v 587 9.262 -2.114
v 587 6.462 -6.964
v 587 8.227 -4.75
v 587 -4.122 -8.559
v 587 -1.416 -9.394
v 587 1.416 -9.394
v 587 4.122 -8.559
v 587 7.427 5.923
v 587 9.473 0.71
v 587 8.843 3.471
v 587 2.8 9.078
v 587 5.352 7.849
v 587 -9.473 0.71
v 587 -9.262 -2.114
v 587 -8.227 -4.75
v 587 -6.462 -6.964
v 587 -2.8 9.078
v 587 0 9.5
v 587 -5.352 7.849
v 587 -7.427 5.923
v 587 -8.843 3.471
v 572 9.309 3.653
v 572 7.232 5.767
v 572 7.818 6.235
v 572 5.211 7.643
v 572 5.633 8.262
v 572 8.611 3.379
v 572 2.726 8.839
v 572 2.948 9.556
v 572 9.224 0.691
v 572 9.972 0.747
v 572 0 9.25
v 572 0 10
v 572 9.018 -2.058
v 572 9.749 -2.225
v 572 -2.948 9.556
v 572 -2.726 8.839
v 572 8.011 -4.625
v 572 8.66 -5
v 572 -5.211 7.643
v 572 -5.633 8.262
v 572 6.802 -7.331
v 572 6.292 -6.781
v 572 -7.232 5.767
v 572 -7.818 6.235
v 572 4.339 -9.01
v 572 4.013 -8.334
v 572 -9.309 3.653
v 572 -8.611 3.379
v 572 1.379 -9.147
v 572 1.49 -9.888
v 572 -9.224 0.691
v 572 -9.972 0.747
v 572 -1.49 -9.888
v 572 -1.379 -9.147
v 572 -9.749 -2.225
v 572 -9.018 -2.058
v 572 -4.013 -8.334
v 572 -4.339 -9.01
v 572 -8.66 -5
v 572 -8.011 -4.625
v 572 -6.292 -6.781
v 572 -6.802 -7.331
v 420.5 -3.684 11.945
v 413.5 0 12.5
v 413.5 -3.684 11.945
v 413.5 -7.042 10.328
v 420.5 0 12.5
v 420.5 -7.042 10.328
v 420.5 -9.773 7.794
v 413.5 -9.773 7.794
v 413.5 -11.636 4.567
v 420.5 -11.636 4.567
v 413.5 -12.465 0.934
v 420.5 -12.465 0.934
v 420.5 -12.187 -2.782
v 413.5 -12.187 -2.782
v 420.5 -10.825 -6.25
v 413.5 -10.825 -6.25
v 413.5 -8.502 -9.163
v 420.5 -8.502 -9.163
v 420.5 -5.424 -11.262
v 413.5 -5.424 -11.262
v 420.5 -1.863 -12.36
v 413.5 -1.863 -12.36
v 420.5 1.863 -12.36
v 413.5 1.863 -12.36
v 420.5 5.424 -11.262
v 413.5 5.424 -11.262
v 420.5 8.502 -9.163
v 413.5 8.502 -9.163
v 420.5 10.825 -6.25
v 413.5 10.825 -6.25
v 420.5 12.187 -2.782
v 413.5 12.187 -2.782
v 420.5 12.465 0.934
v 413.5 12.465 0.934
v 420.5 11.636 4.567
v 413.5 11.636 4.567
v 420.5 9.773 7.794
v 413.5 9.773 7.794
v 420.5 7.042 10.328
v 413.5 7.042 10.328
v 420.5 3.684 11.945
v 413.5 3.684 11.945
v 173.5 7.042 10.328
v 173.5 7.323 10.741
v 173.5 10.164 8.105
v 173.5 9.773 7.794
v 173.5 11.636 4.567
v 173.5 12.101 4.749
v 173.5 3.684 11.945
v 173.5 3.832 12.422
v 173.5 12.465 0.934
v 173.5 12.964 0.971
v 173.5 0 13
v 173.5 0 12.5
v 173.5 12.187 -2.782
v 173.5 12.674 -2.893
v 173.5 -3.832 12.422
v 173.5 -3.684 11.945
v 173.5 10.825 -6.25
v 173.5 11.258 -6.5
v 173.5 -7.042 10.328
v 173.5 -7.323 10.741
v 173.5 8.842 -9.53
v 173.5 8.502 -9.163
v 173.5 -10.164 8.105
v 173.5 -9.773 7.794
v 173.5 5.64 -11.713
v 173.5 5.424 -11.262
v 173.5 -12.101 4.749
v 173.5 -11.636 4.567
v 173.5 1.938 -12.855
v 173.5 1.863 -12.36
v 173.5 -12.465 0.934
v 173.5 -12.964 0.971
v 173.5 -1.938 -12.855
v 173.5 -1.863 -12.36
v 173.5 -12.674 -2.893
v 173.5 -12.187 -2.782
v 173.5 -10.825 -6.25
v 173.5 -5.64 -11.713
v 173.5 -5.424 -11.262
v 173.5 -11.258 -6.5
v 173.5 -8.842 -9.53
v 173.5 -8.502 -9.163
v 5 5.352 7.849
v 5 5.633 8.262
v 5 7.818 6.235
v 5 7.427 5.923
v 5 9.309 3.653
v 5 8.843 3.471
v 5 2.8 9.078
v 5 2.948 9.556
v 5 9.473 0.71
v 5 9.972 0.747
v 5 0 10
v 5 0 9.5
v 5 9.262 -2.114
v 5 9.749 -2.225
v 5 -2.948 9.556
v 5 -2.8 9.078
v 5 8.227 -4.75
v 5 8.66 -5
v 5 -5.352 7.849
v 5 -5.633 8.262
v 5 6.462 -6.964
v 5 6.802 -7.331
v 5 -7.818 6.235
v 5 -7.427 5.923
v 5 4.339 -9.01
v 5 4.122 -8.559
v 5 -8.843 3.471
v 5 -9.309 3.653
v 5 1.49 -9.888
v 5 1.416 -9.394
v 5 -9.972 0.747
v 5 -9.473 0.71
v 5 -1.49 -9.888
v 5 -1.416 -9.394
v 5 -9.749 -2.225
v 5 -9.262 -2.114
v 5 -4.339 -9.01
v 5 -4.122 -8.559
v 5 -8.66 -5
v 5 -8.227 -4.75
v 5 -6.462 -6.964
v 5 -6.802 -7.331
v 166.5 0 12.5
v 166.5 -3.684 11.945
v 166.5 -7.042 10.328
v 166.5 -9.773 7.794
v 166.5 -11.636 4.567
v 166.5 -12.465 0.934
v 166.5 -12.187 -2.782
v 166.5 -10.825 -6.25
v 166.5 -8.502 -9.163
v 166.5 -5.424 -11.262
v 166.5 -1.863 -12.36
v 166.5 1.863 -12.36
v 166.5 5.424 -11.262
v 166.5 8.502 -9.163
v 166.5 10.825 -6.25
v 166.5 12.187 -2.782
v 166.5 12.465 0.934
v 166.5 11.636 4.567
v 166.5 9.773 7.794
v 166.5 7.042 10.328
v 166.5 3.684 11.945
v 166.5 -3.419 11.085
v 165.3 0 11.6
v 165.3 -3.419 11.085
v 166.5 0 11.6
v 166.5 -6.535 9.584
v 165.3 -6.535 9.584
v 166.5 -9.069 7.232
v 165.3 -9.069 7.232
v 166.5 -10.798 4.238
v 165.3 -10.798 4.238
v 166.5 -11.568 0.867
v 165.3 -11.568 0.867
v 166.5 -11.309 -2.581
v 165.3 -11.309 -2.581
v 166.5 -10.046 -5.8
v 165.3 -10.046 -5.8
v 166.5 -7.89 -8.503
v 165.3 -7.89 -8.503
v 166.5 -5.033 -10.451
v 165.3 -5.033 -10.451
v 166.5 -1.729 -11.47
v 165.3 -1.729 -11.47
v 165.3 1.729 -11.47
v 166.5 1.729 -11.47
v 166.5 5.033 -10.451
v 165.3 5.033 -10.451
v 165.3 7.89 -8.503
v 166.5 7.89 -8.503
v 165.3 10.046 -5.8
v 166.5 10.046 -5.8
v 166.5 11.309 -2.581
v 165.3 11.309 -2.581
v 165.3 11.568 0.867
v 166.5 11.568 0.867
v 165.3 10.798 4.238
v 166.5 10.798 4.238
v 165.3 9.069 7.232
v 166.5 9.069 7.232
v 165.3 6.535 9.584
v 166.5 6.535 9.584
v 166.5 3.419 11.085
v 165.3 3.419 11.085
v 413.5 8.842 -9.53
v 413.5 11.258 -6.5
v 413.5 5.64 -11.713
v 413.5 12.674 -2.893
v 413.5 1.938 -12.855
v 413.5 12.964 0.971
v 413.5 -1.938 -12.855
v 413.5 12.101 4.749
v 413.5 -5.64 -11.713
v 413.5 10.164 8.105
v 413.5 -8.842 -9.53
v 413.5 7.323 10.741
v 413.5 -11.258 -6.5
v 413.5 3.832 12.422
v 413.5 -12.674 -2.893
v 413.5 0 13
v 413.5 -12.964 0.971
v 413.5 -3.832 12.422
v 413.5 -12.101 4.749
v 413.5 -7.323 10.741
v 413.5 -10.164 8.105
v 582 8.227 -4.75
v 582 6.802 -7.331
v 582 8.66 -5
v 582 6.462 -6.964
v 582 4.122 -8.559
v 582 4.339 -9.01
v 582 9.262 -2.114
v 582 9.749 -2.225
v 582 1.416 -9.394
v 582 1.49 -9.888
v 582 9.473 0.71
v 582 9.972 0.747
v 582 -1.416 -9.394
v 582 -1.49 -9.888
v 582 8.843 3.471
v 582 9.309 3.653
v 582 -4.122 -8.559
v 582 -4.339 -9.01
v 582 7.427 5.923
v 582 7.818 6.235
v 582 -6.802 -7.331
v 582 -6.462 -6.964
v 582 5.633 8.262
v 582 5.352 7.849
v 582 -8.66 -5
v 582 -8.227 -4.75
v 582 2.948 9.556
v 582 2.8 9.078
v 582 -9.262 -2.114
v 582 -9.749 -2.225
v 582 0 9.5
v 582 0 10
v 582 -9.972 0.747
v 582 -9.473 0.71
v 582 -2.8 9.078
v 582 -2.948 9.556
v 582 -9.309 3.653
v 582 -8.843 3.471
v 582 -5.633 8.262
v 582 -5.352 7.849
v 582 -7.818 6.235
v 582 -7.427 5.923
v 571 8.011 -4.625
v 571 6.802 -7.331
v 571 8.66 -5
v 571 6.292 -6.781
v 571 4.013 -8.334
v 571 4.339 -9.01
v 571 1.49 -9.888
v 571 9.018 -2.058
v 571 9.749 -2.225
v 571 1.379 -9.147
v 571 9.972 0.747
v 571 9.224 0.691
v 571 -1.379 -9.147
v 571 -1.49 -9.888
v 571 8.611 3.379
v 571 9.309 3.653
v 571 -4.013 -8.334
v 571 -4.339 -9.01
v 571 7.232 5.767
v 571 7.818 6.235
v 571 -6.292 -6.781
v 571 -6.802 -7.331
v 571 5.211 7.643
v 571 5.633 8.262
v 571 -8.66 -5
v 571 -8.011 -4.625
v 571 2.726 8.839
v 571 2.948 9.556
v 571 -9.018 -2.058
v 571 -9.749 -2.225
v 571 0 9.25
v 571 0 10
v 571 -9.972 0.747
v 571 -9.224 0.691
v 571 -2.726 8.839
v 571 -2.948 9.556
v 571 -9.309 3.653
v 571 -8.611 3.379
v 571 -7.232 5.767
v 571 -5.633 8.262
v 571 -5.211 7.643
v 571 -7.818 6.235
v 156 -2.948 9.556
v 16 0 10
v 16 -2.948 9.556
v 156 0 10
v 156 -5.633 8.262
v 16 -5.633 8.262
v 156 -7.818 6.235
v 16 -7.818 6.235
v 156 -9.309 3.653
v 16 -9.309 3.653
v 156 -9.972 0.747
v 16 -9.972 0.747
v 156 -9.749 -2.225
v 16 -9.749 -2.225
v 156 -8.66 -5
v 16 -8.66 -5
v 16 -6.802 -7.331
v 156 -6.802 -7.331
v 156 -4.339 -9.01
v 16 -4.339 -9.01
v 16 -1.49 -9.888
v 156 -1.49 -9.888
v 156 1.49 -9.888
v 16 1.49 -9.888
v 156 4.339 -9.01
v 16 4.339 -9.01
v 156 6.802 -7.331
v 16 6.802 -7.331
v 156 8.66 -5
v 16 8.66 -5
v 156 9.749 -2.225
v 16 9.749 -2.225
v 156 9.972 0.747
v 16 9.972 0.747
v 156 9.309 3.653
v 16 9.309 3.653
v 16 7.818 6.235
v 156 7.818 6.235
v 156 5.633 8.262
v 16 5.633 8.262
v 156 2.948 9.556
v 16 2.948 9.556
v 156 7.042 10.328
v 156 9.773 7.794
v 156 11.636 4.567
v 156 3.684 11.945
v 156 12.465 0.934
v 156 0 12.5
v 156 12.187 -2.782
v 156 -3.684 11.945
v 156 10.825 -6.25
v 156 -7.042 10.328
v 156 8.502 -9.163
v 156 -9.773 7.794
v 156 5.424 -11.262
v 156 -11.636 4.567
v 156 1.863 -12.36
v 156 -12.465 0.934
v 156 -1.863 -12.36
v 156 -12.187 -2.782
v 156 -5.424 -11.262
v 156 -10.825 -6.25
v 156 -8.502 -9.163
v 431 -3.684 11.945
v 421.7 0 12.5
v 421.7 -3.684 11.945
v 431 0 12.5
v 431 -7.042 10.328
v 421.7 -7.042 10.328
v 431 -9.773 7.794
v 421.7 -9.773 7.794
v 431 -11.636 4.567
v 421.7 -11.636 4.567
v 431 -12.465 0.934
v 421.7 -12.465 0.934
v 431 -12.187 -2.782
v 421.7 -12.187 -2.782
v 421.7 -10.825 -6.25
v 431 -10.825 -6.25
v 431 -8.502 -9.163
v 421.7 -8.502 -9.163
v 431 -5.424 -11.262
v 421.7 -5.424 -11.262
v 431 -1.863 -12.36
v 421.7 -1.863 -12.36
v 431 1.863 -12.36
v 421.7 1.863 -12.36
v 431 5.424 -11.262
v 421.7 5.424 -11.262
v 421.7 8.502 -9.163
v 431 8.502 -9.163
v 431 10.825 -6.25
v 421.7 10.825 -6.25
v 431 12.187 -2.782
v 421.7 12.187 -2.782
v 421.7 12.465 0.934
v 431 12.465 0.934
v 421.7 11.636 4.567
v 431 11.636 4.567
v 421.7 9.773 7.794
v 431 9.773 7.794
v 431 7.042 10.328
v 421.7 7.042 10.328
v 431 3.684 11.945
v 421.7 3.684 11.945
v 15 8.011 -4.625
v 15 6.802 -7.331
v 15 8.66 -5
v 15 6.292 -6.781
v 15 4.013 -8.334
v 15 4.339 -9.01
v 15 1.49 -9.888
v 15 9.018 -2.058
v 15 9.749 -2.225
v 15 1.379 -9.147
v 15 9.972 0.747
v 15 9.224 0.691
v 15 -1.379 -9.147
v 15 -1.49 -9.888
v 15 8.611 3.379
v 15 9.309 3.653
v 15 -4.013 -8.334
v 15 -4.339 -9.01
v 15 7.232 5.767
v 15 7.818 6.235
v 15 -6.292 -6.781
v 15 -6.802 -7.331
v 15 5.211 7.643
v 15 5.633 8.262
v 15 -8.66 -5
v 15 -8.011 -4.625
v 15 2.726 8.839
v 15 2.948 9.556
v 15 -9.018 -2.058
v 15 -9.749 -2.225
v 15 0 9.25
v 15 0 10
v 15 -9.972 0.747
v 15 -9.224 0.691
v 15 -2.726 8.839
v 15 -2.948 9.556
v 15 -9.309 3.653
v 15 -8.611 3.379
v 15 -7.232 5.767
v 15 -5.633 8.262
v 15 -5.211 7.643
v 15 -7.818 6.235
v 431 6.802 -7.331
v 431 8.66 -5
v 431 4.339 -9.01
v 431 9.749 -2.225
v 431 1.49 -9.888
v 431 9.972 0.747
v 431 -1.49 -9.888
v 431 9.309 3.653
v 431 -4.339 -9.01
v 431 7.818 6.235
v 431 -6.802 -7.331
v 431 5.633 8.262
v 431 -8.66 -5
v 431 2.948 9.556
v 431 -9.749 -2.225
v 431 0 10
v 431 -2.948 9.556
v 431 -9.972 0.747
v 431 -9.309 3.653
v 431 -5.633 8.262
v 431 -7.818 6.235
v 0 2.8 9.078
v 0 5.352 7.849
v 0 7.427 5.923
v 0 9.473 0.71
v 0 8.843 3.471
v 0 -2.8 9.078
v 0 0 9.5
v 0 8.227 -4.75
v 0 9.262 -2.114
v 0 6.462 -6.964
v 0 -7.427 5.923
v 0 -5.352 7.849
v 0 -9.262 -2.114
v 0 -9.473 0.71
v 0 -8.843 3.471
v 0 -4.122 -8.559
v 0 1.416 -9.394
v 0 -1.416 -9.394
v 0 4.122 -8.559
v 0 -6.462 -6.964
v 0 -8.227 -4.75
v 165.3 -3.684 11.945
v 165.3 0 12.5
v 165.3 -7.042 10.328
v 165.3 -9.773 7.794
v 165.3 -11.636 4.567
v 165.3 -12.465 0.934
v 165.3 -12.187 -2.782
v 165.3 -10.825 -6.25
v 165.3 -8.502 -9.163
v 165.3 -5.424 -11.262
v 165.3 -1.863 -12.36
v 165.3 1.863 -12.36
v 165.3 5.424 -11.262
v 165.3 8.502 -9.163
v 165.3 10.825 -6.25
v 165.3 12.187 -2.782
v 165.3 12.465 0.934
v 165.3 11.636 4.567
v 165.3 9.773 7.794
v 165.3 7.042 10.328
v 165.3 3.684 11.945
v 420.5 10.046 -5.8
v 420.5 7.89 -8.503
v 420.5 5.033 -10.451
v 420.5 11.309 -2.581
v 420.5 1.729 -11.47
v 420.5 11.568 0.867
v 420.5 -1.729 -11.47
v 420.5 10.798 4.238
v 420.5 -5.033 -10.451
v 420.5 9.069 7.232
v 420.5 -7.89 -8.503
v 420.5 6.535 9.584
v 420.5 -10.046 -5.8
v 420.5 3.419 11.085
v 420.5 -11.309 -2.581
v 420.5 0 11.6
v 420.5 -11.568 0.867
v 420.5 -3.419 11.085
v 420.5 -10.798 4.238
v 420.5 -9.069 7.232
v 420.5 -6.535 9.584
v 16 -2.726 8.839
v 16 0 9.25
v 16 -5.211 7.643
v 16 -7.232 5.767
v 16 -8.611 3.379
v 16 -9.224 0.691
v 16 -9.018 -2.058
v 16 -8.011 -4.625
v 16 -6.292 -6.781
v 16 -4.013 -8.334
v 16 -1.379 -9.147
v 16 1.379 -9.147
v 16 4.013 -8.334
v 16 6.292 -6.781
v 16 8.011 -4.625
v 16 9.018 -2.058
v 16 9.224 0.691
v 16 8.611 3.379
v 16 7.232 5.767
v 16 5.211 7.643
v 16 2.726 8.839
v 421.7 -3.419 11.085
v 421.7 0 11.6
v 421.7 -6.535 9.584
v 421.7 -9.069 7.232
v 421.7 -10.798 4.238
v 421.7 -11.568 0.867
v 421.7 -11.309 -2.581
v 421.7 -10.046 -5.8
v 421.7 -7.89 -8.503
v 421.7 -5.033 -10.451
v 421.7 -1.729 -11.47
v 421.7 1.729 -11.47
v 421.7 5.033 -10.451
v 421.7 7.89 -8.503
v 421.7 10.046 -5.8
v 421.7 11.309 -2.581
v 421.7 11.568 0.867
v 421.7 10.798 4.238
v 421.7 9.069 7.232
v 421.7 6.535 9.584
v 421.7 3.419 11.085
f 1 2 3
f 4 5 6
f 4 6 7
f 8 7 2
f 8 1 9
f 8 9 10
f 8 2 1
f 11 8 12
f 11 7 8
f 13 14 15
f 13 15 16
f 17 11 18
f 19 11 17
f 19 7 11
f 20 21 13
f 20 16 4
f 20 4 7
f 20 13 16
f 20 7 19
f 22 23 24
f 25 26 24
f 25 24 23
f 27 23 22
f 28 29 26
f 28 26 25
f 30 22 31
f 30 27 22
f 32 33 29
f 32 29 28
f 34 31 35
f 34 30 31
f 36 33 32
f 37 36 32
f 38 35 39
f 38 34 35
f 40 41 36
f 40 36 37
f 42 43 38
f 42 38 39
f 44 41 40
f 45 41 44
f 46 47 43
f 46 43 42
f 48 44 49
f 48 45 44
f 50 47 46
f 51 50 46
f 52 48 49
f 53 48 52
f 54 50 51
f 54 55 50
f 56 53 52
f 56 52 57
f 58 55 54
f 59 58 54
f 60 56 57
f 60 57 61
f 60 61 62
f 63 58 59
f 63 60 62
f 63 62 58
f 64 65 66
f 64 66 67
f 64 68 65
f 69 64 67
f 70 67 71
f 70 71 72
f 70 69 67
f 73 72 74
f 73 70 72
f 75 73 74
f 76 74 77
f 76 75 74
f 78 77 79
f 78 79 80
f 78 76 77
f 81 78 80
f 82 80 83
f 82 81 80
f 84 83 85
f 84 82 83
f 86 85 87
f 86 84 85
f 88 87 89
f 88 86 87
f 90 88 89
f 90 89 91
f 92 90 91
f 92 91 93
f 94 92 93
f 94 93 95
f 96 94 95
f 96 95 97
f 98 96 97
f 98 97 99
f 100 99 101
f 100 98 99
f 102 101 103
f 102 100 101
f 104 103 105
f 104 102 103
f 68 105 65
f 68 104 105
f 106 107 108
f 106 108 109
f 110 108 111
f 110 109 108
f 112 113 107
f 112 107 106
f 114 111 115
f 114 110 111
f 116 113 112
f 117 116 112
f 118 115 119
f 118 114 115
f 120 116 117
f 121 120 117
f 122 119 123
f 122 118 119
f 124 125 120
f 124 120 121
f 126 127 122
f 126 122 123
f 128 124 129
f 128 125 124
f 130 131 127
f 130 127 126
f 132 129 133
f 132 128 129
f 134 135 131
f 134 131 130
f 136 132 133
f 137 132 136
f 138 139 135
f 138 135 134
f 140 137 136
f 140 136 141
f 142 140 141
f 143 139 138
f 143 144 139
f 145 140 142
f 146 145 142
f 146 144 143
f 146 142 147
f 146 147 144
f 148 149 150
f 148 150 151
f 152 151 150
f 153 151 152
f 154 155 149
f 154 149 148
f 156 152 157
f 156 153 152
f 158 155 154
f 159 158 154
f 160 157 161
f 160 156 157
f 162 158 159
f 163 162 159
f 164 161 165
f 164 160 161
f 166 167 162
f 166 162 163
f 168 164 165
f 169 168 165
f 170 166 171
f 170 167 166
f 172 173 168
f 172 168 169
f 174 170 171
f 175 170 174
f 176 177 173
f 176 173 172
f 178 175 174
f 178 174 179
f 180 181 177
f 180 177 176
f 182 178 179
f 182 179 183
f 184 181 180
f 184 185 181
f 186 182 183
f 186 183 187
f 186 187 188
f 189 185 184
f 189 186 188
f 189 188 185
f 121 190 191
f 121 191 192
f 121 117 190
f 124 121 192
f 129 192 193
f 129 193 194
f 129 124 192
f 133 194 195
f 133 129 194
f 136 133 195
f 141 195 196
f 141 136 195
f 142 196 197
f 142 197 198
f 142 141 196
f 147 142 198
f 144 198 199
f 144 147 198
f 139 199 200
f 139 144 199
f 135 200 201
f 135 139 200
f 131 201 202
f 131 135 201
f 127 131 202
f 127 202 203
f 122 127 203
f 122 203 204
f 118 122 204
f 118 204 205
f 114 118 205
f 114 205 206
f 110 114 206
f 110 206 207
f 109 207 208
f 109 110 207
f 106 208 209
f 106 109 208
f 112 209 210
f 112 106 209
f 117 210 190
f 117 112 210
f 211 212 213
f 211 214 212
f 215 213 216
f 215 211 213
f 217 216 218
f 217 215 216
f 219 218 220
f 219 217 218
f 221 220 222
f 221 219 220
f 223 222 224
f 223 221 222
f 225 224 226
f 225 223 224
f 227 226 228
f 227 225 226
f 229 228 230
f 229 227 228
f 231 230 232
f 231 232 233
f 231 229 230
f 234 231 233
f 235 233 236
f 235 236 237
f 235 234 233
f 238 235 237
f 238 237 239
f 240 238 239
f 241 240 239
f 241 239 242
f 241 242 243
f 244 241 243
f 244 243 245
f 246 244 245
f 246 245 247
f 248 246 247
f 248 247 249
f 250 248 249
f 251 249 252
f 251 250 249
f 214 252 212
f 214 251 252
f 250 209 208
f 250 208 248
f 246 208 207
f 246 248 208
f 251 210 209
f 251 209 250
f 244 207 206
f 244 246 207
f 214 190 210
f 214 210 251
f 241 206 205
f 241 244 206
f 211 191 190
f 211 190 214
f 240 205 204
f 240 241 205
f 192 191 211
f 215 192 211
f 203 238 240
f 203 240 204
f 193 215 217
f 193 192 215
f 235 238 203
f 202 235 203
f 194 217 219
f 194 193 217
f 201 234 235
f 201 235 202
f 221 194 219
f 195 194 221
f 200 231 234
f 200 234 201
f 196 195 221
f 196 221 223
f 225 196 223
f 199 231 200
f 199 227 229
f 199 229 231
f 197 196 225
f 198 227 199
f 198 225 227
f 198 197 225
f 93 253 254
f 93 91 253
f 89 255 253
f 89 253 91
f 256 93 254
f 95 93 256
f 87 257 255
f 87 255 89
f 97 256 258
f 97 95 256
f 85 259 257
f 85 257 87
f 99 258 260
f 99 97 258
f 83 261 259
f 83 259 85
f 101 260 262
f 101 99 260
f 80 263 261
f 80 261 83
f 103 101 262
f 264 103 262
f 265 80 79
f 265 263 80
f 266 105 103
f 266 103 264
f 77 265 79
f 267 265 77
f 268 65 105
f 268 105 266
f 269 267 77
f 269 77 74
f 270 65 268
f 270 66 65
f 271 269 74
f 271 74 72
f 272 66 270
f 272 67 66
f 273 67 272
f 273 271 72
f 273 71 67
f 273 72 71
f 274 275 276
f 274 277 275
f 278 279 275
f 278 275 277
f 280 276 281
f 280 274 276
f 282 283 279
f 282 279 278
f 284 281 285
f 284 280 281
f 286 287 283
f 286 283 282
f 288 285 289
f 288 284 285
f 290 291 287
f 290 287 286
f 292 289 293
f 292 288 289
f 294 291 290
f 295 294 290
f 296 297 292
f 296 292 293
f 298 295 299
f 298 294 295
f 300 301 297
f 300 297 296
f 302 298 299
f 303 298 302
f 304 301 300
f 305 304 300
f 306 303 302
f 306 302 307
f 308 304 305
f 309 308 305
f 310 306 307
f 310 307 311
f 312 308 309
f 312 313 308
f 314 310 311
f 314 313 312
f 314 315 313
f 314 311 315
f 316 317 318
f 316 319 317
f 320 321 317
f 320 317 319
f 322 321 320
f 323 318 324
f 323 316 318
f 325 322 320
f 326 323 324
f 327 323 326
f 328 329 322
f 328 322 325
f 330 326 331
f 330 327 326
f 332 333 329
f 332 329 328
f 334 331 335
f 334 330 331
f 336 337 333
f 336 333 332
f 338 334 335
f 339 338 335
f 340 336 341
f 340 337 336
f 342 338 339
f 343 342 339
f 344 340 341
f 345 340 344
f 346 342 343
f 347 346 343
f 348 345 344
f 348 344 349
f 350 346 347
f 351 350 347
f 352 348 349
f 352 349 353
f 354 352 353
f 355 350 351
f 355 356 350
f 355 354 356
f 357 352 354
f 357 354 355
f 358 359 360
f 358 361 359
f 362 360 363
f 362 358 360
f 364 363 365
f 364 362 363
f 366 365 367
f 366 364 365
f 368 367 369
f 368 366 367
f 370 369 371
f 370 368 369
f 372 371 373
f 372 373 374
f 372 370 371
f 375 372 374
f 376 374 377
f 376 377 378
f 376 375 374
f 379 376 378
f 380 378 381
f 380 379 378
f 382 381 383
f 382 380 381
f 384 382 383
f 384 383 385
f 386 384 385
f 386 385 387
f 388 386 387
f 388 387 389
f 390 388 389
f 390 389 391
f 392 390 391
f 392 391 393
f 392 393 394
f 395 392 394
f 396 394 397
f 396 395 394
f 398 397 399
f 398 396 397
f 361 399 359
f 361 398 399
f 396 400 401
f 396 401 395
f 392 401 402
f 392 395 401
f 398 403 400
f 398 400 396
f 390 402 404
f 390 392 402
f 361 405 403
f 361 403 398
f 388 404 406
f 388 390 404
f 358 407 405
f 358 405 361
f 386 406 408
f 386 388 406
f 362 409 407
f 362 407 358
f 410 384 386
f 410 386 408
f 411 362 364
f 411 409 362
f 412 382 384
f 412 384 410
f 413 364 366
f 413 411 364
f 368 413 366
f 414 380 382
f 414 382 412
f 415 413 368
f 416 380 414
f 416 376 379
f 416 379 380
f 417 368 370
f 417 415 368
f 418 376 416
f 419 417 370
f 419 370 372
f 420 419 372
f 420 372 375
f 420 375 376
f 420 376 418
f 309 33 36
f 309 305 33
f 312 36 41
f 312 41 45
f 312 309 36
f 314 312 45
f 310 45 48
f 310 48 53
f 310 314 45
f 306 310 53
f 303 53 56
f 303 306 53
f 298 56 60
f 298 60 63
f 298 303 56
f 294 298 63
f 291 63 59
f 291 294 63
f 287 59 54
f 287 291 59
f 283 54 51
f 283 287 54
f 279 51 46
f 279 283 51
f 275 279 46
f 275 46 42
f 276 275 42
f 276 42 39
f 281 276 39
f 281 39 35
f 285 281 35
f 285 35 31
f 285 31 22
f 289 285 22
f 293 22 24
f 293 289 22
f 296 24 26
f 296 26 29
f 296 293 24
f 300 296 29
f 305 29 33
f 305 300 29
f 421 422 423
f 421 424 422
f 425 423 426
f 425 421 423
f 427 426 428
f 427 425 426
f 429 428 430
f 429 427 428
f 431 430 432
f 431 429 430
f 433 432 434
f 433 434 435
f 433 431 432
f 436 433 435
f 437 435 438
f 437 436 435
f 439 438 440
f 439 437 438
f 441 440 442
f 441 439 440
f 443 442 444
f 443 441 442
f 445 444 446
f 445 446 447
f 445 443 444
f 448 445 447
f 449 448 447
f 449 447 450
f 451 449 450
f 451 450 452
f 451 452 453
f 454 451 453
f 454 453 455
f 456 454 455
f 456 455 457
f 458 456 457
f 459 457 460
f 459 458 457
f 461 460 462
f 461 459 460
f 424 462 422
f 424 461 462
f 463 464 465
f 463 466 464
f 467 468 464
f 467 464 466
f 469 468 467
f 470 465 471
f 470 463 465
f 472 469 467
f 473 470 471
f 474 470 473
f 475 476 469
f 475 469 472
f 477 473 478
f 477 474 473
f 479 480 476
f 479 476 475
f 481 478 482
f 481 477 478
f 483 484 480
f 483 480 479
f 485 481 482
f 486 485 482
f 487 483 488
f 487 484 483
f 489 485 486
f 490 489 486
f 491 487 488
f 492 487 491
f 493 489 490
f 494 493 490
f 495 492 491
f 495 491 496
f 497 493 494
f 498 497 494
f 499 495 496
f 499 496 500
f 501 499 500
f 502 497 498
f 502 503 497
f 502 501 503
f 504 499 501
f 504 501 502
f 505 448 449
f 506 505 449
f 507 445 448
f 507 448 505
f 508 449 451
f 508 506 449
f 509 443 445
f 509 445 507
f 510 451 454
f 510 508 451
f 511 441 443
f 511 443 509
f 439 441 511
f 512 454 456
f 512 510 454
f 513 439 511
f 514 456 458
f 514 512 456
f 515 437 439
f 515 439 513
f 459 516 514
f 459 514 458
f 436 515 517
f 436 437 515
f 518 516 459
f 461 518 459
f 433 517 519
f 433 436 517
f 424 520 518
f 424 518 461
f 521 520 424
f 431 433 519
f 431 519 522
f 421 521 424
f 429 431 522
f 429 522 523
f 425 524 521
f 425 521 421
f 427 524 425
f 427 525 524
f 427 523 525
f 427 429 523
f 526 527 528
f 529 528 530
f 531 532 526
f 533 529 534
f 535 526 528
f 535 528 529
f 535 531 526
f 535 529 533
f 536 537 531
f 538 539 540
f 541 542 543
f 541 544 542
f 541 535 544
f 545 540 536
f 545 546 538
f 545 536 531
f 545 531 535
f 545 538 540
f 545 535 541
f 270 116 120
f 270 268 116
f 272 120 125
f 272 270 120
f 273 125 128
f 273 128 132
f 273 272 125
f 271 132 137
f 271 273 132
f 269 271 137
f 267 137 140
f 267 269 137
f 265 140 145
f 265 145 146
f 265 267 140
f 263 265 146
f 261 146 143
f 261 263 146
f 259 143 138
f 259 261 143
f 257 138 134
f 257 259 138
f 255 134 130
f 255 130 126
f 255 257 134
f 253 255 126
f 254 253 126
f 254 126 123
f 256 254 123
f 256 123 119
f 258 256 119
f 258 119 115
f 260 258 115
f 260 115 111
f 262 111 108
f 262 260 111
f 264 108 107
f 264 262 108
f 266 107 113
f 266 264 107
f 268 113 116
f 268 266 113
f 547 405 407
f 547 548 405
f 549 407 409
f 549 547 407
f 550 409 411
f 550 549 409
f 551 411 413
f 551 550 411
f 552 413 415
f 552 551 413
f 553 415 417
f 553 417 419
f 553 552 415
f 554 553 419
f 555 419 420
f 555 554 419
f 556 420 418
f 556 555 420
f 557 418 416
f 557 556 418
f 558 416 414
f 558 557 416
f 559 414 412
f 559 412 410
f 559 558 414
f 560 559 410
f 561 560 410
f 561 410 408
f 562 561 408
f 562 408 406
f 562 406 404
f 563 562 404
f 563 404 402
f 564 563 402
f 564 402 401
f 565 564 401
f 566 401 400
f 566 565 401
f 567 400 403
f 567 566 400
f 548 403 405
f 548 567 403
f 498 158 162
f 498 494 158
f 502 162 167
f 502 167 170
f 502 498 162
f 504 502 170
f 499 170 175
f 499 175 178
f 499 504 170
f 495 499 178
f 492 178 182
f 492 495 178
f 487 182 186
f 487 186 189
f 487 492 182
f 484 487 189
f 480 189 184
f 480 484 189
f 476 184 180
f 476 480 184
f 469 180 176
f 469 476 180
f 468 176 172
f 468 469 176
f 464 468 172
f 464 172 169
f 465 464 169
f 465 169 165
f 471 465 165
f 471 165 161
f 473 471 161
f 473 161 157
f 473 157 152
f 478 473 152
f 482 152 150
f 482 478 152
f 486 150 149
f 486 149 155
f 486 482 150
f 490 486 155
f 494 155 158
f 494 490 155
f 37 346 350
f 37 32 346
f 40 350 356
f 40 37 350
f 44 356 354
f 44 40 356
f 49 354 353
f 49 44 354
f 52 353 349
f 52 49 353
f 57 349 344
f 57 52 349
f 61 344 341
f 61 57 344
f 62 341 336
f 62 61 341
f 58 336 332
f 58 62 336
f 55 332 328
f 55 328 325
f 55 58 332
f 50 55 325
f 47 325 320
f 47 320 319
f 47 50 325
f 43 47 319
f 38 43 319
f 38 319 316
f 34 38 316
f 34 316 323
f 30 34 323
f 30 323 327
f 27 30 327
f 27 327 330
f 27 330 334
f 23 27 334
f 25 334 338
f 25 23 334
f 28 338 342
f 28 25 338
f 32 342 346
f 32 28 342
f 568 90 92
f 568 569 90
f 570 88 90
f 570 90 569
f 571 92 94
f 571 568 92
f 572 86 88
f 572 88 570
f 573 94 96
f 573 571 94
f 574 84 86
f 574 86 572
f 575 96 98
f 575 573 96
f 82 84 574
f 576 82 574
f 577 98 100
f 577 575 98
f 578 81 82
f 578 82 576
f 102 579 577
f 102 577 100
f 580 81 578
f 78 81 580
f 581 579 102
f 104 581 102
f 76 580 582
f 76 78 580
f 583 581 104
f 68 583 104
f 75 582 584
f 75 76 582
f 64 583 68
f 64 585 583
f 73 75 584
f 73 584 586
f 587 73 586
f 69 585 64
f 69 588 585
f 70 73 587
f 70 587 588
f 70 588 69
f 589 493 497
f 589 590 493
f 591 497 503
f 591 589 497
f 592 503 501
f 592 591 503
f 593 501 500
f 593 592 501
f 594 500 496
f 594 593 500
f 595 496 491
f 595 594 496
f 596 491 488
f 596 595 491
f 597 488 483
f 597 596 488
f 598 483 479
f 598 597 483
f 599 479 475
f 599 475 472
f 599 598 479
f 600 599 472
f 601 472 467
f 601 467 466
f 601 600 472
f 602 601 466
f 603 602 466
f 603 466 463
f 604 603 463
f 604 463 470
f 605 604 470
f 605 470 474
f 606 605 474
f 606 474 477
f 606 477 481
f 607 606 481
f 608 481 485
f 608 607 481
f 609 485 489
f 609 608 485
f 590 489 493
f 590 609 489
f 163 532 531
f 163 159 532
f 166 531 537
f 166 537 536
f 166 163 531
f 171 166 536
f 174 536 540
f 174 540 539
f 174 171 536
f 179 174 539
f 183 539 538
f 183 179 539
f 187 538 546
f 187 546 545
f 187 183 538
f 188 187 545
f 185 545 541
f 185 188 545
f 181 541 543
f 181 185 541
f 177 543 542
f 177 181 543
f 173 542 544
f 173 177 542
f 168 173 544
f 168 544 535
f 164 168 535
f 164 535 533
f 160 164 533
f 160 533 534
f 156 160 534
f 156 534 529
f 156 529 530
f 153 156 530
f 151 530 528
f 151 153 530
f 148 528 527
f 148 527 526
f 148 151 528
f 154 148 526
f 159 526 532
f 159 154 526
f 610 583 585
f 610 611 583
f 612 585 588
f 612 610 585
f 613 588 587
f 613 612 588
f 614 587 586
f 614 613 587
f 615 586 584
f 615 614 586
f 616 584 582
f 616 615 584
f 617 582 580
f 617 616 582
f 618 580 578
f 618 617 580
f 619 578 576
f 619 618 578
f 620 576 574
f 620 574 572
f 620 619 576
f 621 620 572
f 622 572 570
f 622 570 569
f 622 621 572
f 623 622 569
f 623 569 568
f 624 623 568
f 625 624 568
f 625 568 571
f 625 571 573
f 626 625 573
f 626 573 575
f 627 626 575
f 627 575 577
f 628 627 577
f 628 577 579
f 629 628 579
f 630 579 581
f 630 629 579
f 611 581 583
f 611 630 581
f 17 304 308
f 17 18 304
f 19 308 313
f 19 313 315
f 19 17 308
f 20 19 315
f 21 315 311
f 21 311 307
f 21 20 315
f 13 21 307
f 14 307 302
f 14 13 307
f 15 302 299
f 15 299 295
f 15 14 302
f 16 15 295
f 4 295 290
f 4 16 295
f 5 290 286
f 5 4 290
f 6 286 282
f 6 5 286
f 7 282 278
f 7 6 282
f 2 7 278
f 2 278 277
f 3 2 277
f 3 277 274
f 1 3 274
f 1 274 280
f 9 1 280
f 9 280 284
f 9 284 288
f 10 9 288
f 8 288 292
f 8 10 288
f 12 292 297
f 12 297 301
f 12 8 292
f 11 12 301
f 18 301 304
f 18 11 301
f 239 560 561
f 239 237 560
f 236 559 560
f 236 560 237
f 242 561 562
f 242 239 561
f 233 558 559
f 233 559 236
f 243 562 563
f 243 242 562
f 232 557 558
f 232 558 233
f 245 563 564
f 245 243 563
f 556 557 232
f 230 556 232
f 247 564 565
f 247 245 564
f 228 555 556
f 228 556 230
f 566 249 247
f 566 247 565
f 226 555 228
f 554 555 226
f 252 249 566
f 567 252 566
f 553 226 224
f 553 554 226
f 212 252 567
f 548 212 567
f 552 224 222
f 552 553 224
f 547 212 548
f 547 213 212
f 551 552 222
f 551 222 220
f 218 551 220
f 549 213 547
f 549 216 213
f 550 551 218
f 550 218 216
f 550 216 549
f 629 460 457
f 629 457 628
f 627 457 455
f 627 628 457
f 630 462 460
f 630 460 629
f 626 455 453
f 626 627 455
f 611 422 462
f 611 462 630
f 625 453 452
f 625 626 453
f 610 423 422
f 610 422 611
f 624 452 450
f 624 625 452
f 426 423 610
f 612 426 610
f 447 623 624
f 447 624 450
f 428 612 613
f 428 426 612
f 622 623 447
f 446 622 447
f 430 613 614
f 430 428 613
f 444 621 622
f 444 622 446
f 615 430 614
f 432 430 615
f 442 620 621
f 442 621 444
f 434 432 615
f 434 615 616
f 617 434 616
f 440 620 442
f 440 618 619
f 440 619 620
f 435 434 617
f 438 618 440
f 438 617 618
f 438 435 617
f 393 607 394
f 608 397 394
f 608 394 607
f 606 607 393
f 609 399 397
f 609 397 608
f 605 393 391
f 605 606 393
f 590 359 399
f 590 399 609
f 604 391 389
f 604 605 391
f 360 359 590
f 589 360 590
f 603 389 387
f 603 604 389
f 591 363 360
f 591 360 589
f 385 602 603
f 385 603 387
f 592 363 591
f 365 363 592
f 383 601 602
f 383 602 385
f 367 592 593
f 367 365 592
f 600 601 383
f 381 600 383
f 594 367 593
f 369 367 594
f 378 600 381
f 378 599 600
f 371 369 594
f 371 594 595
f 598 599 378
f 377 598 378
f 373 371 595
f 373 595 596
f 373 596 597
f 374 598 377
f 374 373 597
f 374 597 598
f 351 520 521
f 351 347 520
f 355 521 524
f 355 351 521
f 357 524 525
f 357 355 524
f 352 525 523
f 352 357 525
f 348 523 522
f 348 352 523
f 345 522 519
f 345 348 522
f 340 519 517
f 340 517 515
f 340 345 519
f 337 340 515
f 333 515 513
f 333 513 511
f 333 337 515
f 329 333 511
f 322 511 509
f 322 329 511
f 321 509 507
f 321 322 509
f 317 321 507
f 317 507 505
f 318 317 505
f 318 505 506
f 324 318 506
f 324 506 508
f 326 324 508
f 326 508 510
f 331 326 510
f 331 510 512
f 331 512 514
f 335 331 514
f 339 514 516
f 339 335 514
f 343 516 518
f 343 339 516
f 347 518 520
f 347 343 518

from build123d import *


with BuildPart() as part:
    # 草图1 → 旋转1 (revolve)
    with BuildSketch(Plane(origin=(0, 0, 0), x_dir=(1, 0, 0), z_dir=(0, 1, 0)), mode=Mode.PRIVATE) as revolve_1_sk:
        Polygon((0, 0), (0, 9.5), (5, 9.5), (5, 10), (15, 10), (15, 9.25), (16, 9.25), (16, 10), (156, 10), (156, 12.5), (165.3, 12.5), (165.3, 11.6), (166.5, 11.6), (166.5, 12.5), (173.5, 12.5), (173.5, 13), (413.5, 13), (413.5, 12.5), (420.5, 12.5), (420.5, 11.6), (421.7, 11.6), (421.7, 12.5), (431, 12.5), (431, 10), (571, 10), (571, 9.25), (572, 9.25), (572, 10), (582, 10), (582, 9.5), (587, 9.5), (587, 0), align=None)
    revolve(revolve_1_sk.sketch.rotate(Axis((-75.612934102, 0, 0), (1, 0, 0)), 180), axis=Axis((-75.612934102, 0, 0), (1, 0, 0)))


solid = part.part
